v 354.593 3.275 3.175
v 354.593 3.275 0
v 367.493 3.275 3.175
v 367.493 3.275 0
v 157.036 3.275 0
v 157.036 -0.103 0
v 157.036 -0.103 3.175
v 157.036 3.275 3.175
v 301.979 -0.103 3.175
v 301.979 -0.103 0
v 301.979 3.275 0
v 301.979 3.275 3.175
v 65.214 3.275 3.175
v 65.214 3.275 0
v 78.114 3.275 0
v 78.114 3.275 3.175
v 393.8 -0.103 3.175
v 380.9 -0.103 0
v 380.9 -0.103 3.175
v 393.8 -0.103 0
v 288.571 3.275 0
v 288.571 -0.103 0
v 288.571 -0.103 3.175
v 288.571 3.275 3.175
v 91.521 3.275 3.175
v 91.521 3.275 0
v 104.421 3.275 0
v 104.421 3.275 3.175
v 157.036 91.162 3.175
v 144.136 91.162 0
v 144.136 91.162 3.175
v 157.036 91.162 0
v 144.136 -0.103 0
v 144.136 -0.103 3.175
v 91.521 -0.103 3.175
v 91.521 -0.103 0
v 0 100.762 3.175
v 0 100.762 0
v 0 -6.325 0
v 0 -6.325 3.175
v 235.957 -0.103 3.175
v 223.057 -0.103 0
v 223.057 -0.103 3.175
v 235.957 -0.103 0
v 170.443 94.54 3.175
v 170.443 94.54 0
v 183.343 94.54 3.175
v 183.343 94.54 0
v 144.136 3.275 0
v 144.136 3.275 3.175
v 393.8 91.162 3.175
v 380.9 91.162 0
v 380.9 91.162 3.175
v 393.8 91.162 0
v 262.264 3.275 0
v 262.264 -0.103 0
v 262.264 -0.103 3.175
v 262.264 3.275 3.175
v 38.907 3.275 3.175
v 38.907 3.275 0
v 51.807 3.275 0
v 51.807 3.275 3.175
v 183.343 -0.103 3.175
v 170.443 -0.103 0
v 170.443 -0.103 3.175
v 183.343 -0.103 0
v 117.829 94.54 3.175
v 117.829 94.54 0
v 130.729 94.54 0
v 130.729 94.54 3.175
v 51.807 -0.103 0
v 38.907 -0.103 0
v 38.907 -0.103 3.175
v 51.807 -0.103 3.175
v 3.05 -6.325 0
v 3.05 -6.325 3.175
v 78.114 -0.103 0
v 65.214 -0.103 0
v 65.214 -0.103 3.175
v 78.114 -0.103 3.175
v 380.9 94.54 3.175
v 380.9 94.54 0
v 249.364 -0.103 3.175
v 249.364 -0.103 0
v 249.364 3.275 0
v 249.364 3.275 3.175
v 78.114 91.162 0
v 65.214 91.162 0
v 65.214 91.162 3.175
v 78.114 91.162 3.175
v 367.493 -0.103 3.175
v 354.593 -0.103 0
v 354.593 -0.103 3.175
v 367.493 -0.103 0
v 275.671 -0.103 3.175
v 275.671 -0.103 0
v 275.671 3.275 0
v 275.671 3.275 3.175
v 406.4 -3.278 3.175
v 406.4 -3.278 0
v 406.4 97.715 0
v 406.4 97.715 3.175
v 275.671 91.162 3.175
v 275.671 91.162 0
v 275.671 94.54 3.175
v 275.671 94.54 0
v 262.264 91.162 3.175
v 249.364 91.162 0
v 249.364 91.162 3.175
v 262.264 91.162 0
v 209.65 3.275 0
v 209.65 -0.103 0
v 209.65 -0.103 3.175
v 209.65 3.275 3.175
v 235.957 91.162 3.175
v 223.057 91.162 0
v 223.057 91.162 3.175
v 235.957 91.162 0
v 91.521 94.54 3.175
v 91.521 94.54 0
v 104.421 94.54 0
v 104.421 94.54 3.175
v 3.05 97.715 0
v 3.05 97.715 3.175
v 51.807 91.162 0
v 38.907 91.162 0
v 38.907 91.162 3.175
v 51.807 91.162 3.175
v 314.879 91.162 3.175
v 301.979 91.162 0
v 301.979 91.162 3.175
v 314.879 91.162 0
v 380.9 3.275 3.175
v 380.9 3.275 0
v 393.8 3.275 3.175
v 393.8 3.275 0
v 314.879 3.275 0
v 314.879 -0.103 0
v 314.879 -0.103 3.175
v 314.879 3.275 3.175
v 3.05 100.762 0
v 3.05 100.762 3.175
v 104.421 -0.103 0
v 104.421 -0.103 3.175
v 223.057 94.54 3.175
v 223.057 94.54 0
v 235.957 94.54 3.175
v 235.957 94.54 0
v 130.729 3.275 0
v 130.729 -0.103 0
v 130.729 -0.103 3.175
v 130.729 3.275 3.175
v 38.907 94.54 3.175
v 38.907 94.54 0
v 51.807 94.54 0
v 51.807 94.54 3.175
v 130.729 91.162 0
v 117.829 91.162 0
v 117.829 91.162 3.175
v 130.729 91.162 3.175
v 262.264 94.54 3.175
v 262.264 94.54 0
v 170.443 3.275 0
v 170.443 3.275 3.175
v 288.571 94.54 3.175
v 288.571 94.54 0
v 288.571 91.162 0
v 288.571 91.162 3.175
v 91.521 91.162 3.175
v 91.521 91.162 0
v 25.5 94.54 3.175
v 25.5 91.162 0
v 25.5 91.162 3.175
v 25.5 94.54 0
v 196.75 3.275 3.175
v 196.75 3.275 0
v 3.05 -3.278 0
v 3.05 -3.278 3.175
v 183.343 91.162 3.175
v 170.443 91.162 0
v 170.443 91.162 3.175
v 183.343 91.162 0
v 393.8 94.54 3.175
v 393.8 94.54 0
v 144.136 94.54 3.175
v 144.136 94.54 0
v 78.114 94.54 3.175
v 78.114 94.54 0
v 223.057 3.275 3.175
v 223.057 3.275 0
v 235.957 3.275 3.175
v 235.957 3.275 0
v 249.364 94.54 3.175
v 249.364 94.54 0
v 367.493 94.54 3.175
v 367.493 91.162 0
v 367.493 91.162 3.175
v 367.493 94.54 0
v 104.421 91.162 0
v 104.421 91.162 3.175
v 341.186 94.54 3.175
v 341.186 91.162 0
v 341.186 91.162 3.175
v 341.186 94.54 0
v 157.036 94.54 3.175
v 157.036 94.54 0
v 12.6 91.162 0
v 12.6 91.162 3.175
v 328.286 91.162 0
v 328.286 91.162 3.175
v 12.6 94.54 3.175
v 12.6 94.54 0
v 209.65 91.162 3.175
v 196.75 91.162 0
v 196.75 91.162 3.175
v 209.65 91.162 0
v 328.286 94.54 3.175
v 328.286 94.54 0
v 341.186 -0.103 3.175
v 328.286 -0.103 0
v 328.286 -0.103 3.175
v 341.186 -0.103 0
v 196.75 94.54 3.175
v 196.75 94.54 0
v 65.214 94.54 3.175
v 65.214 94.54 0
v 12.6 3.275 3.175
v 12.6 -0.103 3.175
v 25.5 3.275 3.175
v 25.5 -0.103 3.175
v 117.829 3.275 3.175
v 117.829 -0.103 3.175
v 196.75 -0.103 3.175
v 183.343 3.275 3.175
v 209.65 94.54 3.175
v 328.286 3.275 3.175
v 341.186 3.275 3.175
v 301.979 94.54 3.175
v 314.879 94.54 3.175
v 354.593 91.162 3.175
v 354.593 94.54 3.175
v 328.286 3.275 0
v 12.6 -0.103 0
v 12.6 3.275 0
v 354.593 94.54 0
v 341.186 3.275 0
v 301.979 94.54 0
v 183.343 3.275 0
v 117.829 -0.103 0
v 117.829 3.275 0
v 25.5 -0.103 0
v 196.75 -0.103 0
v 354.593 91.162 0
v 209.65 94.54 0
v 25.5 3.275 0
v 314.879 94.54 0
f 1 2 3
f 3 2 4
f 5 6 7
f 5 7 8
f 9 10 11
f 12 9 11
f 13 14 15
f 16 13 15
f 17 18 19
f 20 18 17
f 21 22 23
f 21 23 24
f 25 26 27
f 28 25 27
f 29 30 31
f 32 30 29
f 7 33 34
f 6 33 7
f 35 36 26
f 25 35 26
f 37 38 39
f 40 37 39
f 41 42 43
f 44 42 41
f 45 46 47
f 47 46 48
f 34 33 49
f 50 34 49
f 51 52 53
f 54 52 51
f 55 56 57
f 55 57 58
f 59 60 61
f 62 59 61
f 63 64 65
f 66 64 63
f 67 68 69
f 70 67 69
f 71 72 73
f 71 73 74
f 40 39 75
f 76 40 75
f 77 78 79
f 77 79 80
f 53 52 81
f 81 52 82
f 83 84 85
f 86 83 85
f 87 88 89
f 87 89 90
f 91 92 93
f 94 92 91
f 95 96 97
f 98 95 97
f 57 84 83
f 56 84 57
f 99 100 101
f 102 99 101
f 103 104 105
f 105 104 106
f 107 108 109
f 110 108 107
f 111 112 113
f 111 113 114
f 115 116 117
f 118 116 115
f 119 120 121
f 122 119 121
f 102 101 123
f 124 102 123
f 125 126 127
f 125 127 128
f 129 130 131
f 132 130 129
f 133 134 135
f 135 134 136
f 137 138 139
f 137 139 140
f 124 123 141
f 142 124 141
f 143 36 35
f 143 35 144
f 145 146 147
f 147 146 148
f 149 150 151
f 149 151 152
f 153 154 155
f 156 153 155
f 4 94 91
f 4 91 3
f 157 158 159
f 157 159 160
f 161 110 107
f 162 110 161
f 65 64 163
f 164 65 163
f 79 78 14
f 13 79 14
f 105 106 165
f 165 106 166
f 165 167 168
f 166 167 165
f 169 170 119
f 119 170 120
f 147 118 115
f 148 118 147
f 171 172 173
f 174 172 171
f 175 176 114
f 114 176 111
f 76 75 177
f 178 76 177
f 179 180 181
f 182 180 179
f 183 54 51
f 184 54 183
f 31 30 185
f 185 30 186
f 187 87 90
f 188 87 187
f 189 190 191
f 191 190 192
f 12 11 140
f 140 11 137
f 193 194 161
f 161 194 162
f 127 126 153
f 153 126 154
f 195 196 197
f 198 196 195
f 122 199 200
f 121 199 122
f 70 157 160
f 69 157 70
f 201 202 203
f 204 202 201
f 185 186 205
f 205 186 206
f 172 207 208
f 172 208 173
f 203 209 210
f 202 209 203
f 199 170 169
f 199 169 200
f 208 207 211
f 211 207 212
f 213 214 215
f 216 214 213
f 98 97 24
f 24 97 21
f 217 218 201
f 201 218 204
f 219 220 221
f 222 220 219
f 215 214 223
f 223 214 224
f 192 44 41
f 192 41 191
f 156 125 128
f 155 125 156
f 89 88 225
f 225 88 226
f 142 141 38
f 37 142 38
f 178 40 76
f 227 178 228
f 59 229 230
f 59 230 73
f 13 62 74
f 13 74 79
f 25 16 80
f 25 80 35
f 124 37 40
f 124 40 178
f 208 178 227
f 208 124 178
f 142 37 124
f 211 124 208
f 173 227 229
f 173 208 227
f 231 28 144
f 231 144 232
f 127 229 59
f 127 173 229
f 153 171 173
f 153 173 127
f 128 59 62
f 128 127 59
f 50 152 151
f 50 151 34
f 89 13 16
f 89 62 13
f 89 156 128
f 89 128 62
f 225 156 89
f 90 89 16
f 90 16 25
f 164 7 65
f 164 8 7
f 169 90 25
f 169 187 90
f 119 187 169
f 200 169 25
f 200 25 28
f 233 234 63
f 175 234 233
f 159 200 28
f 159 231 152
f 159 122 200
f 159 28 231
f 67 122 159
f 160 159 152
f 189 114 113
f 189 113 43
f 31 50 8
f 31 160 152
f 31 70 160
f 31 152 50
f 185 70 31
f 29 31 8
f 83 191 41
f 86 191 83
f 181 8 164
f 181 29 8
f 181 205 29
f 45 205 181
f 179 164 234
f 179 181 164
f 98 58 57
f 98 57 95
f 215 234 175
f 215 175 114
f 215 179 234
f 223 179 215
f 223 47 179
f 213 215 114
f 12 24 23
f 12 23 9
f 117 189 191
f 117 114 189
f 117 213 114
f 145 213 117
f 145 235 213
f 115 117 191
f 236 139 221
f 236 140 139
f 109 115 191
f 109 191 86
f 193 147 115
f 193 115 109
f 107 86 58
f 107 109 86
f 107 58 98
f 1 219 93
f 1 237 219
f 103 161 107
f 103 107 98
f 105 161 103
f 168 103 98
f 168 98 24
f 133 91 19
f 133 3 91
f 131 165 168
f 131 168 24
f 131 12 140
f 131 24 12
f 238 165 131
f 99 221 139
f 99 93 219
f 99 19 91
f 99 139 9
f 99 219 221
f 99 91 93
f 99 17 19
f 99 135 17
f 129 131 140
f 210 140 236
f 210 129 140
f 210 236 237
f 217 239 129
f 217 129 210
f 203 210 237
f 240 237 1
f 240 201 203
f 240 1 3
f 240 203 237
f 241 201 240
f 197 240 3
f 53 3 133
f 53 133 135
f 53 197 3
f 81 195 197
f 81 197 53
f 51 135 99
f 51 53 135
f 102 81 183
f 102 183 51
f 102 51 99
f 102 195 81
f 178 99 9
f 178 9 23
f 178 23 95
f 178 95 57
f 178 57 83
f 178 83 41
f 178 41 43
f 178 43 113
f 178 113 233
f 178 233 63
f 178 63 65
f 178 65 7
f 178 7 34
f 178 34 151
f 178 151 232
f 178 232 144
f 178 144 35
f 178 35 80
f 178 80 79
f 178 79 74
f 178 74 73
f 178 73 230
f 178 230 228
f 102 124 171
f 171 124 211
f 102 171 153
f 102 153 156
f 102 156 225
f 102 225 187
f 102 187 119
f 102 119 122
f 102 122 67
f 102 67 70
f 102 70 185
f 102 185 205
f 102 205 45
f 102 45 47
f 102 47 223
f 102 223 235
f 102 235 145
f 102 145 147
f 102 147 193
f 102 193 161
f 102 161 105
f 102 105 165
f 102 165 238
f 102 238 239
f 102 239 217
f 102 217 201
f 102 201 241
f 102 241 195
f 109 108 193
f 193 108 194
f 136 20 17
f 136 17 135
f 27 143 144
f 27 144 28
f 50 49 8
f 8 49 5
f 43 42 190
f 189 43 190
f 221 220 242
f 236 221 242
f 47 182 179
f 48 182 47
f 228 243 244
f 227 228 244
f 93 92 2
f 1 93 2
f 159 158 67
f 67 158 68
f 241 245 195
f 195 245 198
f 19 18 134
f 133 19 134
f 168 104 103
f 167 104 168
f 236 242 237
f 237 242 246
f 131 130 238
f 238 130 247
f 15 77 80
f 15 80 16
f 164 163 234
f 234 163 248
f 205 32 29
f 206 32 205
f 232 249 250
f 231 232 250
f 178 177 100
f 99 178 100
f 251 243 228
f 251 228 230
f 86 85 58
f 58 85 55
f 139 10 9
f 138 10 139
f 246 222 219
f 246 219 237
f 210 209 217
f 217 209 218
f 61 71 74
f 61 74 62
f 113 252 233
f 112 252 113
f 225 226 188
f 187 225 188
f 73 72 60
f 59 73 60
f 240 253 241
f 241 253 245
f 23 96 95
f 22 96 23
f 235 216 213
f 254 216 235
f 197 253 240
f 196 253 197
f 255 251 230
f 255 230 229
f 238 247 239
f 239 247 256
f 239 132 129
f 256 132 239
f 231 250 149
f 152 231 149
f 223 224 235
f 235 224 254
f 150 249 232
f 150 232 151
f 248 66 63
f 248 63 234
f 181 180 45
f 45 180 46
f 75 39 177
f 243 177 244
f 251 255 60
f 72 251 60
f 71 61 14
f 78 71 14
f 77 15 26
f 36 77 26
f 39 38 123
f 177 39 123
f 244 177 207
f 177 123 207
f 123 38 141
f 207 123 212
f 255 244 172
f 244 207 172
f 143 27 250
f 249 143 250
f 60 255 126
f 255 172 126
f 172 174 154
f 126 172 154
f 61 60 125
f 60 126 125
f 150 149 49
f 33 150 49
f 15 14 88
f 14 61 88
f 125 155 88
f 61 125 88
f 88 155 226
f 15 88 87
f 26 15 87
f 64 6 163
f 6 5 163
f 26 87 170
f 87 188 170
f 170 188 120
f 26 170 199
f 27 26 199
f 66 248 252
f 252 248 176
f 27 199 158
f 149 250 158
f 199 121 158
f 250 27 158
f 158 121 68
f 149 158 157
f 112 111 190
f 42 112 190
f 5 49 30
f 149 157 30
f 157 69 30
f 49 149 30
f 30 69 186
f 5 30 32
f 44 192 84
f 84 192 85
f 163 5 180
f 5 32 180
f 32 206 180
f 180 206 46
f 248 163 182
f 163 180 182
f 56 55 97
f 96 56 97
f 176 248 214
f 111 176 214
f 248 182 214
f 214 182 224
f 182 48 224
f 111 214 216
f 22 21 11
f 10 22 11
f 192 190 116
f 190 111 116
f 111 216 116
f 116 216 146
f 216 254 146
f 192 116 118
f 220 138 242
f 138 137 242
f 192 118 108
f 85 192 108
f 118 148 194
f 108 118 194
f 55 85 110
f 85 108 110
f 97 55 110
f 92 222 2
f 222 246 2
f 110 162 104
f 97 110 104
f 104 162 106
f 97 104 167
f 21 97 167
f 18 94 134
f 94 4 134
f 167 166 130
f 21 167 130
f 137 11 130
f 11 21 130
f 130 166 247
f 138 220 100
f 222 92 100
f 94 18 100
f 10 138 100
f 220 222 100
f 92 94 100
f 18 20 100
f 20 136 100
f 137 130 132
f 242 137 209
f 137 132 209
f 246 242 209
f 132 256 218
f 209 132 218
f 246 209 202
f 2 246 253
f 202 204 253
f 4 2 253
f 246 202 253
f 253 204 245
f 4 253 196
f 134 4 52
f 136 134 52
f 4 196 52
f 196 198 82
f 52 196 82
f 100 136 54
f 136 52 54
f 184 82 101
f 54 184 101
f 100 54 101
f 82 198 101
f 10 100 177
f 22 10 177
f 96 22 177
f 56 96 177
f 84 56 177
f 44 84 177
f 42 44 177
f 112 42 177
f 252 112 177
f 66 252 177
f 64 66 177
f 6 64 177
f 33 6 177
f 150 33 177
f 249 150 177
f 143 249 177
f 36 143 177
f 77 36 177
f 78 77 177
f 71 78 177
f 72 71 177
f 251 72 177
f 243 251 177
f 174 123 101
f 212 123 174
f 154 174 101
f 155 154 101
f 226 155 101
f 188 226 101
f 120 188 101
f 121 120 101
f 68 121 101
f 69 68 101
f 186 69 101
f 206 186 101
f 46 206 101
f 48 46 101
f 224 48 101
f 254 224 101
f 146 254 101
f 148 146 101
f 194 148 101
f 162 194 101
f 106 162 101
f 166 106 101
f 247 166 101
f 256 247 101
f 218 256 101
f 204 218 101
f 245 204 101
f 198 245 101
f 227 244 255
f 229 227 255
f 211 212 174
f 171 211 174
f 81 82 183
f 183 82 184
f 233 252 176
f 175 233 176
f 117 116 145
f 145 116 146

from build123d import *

# Parameters (mm, degrees)
SKETCH1_W           = 12.9
SKETCH1_H           = 3.3782
BOSS_EXTRUDE1_DEPTH = 3.175


with BuildPart() as part:
    # Sketch1 → Boss-Extrude1 (new body)
    with BuildSketch(Plane.XY):
        Polygon((3.0496002, 100.7618), (0, 100.7618), (0, -6.3246), (3.0496002, -6.3246), (3.0496002, -3.2782), (406.4, -3.2782), (406.4, 97.7154), (3.0496002, 97.7154), align=None)
        with Locations((19.05, 92.8513)):
            Rectangle(SKETCH1_W, SKETCH1_H, mode=Mode.SUBTRACT)
        with Locations((45.357142857, 92.8513)):
            Rectangle(SKETCH1_W, SKETCH1_H, mode=Mode.SUBTRACT)
        with Locations((387.35, 92.8513)):
            Rectangle(SKETCH1_W, SKETCH1_H, mode=Mode.SUBTRACT)
        with Locations((361.042857143, 92.8513)):
            Rectangle(SKETCH1_W, SKETCH1_H, mode=Mode.SUBTRACT)
        with Locations((71.664285714, 92.8513)):
            Rectangle(SKETCH1_W, SKETCH1_H, mode=Mode.SUBTRACT)
        with Locations((97.971428571, 92.8513)):
            Rectangle(SKETCH1_W, SKETCH1_H, mode=Mode.SUBTRACT)
        with Locations((124.278571429, 92.8513)):
            Rectangle(SKETCH1_W, SKETCH1_H, mode=Mode.SUBTRACT)
        with Locations((150.585714286, 92.8513)):
            Rectangle(SKETCH1_W, SKETCH1_H, mode=Mode.SUBTRACT)
        with Locations((176.892857143, 92.8513)):
            Rectangle(SKETCH1_W, SKETCH1_H, mode=Mode.SUBTRACT)
        with Locations((203.2, 92.8513)):
            Rectangle(SKETCH1_W, SKETCH1_H, mode=Mode.SUBTRACT)
        with Locations((229.507142857, 92.8513)):
            Rectangle(SKETCH1_W, SKETCH1_H, mode=Mode.SUBTRACT)
        with Locations((255.814285714, 92.8513)):
            Rectangle(SKETCH1_W, SKETCH1_H, mode=Mode.SUBTRACT)
        with Locations((282.121428571, 92.8513)):
            Rectangle(SKETCH1_W, SKETCH1_H, mode=Mode.SUBTRACT)
        with Locations((308.428571429, 92.8513)):
            Rectangle(SKETCH1_W, SKETCH1_H, mode=Mode.SUBTRACT)
        with Locations((334.735714286, 92.8513)):
            Rectangle(SKETCH1_W, SKETCH1_H, mode=Mode.SUBTRACT)
        with Locations((387.35, 1.5859)):
            Rectangle(SKETCH1_W, SKETCH1_H, mode=Mode.SUBTRACT)
        with Locations((361.042857143, 1.5859)):
            Rectangle(SKETCH1_W, SKETCH1_H, mode=Mode.SUBTRACT)
        with Locations((334.735714286, 1.5859)):
            Rectangle(SKETCH1_W, SKETCH1_H, mode=Mode.SUBTRACT)
        with Locations((308.428571429, 1.5859)):
            Rectangle(SKETCH1_W, SKETCH1_H, mode=Mode.SUBTRACT)
        with Locations((282.121428571, 1.5859)):
            Rectangle(SKETCH1_W, SKETCH1_H, mode=Mode.SUBTRACT)
        with Locations((255.814285714, 1.5859)):
            Rectangle(SKETCH1_W, SKETCH1_H, mode=Mode.SUBTRACT)
        with Locations((229.507142857, 1.5859)):
            Rectangle(SKETCH1_W, SKETCH1_H, mode=Mode.SUBTRACT)
        with Locations((203.2, 1.5859)):
            Rectangle(SKETCH1_W, SKETCH1_H, mode=Mode.SUBTRACT)
        with Locations((176.892857143, 1.5859)):
            Rectangle(SKETCH1_W, SKETCH1_H, mode=Mode.SUBTRACT)
        with Locations((150.585714286, 1.5859)):
            Rectangle(SKETCH1_W, SKETCH1_H, mode=Mode.SUBTRACT)
        with Locations((124.278571429, 1.5859)):
            Rectangle(SKETCH1_W, SKETCH1_H, mode=Mode.SUBTRACT)
        with Locations((97.971428571, 1.5859)):
            Rectangle(SKETCH1_W, SKETCH1_H, mode=Mode.SUBTRACT)
        with Locations((71.664285714, 1.5859)):
            Rectangle(SKETCH1_W, SKETCH1_H, mode=Mode.SUBTRACT)
        with Locations((45.357142857, 1.5859)):
            Rectangle(SKETCH1_W, SKETCH1_H, mode=Mode.SUBTRACT)
        with Locations((19.05, 1.5859)):
            Rectangle(SKETCH1_W, SKETCH1_H, mode=Mode.SUBTRACT)
    extrude(amount=BOSS_EXTRUDE1_DEPTH)


solid = part.part
